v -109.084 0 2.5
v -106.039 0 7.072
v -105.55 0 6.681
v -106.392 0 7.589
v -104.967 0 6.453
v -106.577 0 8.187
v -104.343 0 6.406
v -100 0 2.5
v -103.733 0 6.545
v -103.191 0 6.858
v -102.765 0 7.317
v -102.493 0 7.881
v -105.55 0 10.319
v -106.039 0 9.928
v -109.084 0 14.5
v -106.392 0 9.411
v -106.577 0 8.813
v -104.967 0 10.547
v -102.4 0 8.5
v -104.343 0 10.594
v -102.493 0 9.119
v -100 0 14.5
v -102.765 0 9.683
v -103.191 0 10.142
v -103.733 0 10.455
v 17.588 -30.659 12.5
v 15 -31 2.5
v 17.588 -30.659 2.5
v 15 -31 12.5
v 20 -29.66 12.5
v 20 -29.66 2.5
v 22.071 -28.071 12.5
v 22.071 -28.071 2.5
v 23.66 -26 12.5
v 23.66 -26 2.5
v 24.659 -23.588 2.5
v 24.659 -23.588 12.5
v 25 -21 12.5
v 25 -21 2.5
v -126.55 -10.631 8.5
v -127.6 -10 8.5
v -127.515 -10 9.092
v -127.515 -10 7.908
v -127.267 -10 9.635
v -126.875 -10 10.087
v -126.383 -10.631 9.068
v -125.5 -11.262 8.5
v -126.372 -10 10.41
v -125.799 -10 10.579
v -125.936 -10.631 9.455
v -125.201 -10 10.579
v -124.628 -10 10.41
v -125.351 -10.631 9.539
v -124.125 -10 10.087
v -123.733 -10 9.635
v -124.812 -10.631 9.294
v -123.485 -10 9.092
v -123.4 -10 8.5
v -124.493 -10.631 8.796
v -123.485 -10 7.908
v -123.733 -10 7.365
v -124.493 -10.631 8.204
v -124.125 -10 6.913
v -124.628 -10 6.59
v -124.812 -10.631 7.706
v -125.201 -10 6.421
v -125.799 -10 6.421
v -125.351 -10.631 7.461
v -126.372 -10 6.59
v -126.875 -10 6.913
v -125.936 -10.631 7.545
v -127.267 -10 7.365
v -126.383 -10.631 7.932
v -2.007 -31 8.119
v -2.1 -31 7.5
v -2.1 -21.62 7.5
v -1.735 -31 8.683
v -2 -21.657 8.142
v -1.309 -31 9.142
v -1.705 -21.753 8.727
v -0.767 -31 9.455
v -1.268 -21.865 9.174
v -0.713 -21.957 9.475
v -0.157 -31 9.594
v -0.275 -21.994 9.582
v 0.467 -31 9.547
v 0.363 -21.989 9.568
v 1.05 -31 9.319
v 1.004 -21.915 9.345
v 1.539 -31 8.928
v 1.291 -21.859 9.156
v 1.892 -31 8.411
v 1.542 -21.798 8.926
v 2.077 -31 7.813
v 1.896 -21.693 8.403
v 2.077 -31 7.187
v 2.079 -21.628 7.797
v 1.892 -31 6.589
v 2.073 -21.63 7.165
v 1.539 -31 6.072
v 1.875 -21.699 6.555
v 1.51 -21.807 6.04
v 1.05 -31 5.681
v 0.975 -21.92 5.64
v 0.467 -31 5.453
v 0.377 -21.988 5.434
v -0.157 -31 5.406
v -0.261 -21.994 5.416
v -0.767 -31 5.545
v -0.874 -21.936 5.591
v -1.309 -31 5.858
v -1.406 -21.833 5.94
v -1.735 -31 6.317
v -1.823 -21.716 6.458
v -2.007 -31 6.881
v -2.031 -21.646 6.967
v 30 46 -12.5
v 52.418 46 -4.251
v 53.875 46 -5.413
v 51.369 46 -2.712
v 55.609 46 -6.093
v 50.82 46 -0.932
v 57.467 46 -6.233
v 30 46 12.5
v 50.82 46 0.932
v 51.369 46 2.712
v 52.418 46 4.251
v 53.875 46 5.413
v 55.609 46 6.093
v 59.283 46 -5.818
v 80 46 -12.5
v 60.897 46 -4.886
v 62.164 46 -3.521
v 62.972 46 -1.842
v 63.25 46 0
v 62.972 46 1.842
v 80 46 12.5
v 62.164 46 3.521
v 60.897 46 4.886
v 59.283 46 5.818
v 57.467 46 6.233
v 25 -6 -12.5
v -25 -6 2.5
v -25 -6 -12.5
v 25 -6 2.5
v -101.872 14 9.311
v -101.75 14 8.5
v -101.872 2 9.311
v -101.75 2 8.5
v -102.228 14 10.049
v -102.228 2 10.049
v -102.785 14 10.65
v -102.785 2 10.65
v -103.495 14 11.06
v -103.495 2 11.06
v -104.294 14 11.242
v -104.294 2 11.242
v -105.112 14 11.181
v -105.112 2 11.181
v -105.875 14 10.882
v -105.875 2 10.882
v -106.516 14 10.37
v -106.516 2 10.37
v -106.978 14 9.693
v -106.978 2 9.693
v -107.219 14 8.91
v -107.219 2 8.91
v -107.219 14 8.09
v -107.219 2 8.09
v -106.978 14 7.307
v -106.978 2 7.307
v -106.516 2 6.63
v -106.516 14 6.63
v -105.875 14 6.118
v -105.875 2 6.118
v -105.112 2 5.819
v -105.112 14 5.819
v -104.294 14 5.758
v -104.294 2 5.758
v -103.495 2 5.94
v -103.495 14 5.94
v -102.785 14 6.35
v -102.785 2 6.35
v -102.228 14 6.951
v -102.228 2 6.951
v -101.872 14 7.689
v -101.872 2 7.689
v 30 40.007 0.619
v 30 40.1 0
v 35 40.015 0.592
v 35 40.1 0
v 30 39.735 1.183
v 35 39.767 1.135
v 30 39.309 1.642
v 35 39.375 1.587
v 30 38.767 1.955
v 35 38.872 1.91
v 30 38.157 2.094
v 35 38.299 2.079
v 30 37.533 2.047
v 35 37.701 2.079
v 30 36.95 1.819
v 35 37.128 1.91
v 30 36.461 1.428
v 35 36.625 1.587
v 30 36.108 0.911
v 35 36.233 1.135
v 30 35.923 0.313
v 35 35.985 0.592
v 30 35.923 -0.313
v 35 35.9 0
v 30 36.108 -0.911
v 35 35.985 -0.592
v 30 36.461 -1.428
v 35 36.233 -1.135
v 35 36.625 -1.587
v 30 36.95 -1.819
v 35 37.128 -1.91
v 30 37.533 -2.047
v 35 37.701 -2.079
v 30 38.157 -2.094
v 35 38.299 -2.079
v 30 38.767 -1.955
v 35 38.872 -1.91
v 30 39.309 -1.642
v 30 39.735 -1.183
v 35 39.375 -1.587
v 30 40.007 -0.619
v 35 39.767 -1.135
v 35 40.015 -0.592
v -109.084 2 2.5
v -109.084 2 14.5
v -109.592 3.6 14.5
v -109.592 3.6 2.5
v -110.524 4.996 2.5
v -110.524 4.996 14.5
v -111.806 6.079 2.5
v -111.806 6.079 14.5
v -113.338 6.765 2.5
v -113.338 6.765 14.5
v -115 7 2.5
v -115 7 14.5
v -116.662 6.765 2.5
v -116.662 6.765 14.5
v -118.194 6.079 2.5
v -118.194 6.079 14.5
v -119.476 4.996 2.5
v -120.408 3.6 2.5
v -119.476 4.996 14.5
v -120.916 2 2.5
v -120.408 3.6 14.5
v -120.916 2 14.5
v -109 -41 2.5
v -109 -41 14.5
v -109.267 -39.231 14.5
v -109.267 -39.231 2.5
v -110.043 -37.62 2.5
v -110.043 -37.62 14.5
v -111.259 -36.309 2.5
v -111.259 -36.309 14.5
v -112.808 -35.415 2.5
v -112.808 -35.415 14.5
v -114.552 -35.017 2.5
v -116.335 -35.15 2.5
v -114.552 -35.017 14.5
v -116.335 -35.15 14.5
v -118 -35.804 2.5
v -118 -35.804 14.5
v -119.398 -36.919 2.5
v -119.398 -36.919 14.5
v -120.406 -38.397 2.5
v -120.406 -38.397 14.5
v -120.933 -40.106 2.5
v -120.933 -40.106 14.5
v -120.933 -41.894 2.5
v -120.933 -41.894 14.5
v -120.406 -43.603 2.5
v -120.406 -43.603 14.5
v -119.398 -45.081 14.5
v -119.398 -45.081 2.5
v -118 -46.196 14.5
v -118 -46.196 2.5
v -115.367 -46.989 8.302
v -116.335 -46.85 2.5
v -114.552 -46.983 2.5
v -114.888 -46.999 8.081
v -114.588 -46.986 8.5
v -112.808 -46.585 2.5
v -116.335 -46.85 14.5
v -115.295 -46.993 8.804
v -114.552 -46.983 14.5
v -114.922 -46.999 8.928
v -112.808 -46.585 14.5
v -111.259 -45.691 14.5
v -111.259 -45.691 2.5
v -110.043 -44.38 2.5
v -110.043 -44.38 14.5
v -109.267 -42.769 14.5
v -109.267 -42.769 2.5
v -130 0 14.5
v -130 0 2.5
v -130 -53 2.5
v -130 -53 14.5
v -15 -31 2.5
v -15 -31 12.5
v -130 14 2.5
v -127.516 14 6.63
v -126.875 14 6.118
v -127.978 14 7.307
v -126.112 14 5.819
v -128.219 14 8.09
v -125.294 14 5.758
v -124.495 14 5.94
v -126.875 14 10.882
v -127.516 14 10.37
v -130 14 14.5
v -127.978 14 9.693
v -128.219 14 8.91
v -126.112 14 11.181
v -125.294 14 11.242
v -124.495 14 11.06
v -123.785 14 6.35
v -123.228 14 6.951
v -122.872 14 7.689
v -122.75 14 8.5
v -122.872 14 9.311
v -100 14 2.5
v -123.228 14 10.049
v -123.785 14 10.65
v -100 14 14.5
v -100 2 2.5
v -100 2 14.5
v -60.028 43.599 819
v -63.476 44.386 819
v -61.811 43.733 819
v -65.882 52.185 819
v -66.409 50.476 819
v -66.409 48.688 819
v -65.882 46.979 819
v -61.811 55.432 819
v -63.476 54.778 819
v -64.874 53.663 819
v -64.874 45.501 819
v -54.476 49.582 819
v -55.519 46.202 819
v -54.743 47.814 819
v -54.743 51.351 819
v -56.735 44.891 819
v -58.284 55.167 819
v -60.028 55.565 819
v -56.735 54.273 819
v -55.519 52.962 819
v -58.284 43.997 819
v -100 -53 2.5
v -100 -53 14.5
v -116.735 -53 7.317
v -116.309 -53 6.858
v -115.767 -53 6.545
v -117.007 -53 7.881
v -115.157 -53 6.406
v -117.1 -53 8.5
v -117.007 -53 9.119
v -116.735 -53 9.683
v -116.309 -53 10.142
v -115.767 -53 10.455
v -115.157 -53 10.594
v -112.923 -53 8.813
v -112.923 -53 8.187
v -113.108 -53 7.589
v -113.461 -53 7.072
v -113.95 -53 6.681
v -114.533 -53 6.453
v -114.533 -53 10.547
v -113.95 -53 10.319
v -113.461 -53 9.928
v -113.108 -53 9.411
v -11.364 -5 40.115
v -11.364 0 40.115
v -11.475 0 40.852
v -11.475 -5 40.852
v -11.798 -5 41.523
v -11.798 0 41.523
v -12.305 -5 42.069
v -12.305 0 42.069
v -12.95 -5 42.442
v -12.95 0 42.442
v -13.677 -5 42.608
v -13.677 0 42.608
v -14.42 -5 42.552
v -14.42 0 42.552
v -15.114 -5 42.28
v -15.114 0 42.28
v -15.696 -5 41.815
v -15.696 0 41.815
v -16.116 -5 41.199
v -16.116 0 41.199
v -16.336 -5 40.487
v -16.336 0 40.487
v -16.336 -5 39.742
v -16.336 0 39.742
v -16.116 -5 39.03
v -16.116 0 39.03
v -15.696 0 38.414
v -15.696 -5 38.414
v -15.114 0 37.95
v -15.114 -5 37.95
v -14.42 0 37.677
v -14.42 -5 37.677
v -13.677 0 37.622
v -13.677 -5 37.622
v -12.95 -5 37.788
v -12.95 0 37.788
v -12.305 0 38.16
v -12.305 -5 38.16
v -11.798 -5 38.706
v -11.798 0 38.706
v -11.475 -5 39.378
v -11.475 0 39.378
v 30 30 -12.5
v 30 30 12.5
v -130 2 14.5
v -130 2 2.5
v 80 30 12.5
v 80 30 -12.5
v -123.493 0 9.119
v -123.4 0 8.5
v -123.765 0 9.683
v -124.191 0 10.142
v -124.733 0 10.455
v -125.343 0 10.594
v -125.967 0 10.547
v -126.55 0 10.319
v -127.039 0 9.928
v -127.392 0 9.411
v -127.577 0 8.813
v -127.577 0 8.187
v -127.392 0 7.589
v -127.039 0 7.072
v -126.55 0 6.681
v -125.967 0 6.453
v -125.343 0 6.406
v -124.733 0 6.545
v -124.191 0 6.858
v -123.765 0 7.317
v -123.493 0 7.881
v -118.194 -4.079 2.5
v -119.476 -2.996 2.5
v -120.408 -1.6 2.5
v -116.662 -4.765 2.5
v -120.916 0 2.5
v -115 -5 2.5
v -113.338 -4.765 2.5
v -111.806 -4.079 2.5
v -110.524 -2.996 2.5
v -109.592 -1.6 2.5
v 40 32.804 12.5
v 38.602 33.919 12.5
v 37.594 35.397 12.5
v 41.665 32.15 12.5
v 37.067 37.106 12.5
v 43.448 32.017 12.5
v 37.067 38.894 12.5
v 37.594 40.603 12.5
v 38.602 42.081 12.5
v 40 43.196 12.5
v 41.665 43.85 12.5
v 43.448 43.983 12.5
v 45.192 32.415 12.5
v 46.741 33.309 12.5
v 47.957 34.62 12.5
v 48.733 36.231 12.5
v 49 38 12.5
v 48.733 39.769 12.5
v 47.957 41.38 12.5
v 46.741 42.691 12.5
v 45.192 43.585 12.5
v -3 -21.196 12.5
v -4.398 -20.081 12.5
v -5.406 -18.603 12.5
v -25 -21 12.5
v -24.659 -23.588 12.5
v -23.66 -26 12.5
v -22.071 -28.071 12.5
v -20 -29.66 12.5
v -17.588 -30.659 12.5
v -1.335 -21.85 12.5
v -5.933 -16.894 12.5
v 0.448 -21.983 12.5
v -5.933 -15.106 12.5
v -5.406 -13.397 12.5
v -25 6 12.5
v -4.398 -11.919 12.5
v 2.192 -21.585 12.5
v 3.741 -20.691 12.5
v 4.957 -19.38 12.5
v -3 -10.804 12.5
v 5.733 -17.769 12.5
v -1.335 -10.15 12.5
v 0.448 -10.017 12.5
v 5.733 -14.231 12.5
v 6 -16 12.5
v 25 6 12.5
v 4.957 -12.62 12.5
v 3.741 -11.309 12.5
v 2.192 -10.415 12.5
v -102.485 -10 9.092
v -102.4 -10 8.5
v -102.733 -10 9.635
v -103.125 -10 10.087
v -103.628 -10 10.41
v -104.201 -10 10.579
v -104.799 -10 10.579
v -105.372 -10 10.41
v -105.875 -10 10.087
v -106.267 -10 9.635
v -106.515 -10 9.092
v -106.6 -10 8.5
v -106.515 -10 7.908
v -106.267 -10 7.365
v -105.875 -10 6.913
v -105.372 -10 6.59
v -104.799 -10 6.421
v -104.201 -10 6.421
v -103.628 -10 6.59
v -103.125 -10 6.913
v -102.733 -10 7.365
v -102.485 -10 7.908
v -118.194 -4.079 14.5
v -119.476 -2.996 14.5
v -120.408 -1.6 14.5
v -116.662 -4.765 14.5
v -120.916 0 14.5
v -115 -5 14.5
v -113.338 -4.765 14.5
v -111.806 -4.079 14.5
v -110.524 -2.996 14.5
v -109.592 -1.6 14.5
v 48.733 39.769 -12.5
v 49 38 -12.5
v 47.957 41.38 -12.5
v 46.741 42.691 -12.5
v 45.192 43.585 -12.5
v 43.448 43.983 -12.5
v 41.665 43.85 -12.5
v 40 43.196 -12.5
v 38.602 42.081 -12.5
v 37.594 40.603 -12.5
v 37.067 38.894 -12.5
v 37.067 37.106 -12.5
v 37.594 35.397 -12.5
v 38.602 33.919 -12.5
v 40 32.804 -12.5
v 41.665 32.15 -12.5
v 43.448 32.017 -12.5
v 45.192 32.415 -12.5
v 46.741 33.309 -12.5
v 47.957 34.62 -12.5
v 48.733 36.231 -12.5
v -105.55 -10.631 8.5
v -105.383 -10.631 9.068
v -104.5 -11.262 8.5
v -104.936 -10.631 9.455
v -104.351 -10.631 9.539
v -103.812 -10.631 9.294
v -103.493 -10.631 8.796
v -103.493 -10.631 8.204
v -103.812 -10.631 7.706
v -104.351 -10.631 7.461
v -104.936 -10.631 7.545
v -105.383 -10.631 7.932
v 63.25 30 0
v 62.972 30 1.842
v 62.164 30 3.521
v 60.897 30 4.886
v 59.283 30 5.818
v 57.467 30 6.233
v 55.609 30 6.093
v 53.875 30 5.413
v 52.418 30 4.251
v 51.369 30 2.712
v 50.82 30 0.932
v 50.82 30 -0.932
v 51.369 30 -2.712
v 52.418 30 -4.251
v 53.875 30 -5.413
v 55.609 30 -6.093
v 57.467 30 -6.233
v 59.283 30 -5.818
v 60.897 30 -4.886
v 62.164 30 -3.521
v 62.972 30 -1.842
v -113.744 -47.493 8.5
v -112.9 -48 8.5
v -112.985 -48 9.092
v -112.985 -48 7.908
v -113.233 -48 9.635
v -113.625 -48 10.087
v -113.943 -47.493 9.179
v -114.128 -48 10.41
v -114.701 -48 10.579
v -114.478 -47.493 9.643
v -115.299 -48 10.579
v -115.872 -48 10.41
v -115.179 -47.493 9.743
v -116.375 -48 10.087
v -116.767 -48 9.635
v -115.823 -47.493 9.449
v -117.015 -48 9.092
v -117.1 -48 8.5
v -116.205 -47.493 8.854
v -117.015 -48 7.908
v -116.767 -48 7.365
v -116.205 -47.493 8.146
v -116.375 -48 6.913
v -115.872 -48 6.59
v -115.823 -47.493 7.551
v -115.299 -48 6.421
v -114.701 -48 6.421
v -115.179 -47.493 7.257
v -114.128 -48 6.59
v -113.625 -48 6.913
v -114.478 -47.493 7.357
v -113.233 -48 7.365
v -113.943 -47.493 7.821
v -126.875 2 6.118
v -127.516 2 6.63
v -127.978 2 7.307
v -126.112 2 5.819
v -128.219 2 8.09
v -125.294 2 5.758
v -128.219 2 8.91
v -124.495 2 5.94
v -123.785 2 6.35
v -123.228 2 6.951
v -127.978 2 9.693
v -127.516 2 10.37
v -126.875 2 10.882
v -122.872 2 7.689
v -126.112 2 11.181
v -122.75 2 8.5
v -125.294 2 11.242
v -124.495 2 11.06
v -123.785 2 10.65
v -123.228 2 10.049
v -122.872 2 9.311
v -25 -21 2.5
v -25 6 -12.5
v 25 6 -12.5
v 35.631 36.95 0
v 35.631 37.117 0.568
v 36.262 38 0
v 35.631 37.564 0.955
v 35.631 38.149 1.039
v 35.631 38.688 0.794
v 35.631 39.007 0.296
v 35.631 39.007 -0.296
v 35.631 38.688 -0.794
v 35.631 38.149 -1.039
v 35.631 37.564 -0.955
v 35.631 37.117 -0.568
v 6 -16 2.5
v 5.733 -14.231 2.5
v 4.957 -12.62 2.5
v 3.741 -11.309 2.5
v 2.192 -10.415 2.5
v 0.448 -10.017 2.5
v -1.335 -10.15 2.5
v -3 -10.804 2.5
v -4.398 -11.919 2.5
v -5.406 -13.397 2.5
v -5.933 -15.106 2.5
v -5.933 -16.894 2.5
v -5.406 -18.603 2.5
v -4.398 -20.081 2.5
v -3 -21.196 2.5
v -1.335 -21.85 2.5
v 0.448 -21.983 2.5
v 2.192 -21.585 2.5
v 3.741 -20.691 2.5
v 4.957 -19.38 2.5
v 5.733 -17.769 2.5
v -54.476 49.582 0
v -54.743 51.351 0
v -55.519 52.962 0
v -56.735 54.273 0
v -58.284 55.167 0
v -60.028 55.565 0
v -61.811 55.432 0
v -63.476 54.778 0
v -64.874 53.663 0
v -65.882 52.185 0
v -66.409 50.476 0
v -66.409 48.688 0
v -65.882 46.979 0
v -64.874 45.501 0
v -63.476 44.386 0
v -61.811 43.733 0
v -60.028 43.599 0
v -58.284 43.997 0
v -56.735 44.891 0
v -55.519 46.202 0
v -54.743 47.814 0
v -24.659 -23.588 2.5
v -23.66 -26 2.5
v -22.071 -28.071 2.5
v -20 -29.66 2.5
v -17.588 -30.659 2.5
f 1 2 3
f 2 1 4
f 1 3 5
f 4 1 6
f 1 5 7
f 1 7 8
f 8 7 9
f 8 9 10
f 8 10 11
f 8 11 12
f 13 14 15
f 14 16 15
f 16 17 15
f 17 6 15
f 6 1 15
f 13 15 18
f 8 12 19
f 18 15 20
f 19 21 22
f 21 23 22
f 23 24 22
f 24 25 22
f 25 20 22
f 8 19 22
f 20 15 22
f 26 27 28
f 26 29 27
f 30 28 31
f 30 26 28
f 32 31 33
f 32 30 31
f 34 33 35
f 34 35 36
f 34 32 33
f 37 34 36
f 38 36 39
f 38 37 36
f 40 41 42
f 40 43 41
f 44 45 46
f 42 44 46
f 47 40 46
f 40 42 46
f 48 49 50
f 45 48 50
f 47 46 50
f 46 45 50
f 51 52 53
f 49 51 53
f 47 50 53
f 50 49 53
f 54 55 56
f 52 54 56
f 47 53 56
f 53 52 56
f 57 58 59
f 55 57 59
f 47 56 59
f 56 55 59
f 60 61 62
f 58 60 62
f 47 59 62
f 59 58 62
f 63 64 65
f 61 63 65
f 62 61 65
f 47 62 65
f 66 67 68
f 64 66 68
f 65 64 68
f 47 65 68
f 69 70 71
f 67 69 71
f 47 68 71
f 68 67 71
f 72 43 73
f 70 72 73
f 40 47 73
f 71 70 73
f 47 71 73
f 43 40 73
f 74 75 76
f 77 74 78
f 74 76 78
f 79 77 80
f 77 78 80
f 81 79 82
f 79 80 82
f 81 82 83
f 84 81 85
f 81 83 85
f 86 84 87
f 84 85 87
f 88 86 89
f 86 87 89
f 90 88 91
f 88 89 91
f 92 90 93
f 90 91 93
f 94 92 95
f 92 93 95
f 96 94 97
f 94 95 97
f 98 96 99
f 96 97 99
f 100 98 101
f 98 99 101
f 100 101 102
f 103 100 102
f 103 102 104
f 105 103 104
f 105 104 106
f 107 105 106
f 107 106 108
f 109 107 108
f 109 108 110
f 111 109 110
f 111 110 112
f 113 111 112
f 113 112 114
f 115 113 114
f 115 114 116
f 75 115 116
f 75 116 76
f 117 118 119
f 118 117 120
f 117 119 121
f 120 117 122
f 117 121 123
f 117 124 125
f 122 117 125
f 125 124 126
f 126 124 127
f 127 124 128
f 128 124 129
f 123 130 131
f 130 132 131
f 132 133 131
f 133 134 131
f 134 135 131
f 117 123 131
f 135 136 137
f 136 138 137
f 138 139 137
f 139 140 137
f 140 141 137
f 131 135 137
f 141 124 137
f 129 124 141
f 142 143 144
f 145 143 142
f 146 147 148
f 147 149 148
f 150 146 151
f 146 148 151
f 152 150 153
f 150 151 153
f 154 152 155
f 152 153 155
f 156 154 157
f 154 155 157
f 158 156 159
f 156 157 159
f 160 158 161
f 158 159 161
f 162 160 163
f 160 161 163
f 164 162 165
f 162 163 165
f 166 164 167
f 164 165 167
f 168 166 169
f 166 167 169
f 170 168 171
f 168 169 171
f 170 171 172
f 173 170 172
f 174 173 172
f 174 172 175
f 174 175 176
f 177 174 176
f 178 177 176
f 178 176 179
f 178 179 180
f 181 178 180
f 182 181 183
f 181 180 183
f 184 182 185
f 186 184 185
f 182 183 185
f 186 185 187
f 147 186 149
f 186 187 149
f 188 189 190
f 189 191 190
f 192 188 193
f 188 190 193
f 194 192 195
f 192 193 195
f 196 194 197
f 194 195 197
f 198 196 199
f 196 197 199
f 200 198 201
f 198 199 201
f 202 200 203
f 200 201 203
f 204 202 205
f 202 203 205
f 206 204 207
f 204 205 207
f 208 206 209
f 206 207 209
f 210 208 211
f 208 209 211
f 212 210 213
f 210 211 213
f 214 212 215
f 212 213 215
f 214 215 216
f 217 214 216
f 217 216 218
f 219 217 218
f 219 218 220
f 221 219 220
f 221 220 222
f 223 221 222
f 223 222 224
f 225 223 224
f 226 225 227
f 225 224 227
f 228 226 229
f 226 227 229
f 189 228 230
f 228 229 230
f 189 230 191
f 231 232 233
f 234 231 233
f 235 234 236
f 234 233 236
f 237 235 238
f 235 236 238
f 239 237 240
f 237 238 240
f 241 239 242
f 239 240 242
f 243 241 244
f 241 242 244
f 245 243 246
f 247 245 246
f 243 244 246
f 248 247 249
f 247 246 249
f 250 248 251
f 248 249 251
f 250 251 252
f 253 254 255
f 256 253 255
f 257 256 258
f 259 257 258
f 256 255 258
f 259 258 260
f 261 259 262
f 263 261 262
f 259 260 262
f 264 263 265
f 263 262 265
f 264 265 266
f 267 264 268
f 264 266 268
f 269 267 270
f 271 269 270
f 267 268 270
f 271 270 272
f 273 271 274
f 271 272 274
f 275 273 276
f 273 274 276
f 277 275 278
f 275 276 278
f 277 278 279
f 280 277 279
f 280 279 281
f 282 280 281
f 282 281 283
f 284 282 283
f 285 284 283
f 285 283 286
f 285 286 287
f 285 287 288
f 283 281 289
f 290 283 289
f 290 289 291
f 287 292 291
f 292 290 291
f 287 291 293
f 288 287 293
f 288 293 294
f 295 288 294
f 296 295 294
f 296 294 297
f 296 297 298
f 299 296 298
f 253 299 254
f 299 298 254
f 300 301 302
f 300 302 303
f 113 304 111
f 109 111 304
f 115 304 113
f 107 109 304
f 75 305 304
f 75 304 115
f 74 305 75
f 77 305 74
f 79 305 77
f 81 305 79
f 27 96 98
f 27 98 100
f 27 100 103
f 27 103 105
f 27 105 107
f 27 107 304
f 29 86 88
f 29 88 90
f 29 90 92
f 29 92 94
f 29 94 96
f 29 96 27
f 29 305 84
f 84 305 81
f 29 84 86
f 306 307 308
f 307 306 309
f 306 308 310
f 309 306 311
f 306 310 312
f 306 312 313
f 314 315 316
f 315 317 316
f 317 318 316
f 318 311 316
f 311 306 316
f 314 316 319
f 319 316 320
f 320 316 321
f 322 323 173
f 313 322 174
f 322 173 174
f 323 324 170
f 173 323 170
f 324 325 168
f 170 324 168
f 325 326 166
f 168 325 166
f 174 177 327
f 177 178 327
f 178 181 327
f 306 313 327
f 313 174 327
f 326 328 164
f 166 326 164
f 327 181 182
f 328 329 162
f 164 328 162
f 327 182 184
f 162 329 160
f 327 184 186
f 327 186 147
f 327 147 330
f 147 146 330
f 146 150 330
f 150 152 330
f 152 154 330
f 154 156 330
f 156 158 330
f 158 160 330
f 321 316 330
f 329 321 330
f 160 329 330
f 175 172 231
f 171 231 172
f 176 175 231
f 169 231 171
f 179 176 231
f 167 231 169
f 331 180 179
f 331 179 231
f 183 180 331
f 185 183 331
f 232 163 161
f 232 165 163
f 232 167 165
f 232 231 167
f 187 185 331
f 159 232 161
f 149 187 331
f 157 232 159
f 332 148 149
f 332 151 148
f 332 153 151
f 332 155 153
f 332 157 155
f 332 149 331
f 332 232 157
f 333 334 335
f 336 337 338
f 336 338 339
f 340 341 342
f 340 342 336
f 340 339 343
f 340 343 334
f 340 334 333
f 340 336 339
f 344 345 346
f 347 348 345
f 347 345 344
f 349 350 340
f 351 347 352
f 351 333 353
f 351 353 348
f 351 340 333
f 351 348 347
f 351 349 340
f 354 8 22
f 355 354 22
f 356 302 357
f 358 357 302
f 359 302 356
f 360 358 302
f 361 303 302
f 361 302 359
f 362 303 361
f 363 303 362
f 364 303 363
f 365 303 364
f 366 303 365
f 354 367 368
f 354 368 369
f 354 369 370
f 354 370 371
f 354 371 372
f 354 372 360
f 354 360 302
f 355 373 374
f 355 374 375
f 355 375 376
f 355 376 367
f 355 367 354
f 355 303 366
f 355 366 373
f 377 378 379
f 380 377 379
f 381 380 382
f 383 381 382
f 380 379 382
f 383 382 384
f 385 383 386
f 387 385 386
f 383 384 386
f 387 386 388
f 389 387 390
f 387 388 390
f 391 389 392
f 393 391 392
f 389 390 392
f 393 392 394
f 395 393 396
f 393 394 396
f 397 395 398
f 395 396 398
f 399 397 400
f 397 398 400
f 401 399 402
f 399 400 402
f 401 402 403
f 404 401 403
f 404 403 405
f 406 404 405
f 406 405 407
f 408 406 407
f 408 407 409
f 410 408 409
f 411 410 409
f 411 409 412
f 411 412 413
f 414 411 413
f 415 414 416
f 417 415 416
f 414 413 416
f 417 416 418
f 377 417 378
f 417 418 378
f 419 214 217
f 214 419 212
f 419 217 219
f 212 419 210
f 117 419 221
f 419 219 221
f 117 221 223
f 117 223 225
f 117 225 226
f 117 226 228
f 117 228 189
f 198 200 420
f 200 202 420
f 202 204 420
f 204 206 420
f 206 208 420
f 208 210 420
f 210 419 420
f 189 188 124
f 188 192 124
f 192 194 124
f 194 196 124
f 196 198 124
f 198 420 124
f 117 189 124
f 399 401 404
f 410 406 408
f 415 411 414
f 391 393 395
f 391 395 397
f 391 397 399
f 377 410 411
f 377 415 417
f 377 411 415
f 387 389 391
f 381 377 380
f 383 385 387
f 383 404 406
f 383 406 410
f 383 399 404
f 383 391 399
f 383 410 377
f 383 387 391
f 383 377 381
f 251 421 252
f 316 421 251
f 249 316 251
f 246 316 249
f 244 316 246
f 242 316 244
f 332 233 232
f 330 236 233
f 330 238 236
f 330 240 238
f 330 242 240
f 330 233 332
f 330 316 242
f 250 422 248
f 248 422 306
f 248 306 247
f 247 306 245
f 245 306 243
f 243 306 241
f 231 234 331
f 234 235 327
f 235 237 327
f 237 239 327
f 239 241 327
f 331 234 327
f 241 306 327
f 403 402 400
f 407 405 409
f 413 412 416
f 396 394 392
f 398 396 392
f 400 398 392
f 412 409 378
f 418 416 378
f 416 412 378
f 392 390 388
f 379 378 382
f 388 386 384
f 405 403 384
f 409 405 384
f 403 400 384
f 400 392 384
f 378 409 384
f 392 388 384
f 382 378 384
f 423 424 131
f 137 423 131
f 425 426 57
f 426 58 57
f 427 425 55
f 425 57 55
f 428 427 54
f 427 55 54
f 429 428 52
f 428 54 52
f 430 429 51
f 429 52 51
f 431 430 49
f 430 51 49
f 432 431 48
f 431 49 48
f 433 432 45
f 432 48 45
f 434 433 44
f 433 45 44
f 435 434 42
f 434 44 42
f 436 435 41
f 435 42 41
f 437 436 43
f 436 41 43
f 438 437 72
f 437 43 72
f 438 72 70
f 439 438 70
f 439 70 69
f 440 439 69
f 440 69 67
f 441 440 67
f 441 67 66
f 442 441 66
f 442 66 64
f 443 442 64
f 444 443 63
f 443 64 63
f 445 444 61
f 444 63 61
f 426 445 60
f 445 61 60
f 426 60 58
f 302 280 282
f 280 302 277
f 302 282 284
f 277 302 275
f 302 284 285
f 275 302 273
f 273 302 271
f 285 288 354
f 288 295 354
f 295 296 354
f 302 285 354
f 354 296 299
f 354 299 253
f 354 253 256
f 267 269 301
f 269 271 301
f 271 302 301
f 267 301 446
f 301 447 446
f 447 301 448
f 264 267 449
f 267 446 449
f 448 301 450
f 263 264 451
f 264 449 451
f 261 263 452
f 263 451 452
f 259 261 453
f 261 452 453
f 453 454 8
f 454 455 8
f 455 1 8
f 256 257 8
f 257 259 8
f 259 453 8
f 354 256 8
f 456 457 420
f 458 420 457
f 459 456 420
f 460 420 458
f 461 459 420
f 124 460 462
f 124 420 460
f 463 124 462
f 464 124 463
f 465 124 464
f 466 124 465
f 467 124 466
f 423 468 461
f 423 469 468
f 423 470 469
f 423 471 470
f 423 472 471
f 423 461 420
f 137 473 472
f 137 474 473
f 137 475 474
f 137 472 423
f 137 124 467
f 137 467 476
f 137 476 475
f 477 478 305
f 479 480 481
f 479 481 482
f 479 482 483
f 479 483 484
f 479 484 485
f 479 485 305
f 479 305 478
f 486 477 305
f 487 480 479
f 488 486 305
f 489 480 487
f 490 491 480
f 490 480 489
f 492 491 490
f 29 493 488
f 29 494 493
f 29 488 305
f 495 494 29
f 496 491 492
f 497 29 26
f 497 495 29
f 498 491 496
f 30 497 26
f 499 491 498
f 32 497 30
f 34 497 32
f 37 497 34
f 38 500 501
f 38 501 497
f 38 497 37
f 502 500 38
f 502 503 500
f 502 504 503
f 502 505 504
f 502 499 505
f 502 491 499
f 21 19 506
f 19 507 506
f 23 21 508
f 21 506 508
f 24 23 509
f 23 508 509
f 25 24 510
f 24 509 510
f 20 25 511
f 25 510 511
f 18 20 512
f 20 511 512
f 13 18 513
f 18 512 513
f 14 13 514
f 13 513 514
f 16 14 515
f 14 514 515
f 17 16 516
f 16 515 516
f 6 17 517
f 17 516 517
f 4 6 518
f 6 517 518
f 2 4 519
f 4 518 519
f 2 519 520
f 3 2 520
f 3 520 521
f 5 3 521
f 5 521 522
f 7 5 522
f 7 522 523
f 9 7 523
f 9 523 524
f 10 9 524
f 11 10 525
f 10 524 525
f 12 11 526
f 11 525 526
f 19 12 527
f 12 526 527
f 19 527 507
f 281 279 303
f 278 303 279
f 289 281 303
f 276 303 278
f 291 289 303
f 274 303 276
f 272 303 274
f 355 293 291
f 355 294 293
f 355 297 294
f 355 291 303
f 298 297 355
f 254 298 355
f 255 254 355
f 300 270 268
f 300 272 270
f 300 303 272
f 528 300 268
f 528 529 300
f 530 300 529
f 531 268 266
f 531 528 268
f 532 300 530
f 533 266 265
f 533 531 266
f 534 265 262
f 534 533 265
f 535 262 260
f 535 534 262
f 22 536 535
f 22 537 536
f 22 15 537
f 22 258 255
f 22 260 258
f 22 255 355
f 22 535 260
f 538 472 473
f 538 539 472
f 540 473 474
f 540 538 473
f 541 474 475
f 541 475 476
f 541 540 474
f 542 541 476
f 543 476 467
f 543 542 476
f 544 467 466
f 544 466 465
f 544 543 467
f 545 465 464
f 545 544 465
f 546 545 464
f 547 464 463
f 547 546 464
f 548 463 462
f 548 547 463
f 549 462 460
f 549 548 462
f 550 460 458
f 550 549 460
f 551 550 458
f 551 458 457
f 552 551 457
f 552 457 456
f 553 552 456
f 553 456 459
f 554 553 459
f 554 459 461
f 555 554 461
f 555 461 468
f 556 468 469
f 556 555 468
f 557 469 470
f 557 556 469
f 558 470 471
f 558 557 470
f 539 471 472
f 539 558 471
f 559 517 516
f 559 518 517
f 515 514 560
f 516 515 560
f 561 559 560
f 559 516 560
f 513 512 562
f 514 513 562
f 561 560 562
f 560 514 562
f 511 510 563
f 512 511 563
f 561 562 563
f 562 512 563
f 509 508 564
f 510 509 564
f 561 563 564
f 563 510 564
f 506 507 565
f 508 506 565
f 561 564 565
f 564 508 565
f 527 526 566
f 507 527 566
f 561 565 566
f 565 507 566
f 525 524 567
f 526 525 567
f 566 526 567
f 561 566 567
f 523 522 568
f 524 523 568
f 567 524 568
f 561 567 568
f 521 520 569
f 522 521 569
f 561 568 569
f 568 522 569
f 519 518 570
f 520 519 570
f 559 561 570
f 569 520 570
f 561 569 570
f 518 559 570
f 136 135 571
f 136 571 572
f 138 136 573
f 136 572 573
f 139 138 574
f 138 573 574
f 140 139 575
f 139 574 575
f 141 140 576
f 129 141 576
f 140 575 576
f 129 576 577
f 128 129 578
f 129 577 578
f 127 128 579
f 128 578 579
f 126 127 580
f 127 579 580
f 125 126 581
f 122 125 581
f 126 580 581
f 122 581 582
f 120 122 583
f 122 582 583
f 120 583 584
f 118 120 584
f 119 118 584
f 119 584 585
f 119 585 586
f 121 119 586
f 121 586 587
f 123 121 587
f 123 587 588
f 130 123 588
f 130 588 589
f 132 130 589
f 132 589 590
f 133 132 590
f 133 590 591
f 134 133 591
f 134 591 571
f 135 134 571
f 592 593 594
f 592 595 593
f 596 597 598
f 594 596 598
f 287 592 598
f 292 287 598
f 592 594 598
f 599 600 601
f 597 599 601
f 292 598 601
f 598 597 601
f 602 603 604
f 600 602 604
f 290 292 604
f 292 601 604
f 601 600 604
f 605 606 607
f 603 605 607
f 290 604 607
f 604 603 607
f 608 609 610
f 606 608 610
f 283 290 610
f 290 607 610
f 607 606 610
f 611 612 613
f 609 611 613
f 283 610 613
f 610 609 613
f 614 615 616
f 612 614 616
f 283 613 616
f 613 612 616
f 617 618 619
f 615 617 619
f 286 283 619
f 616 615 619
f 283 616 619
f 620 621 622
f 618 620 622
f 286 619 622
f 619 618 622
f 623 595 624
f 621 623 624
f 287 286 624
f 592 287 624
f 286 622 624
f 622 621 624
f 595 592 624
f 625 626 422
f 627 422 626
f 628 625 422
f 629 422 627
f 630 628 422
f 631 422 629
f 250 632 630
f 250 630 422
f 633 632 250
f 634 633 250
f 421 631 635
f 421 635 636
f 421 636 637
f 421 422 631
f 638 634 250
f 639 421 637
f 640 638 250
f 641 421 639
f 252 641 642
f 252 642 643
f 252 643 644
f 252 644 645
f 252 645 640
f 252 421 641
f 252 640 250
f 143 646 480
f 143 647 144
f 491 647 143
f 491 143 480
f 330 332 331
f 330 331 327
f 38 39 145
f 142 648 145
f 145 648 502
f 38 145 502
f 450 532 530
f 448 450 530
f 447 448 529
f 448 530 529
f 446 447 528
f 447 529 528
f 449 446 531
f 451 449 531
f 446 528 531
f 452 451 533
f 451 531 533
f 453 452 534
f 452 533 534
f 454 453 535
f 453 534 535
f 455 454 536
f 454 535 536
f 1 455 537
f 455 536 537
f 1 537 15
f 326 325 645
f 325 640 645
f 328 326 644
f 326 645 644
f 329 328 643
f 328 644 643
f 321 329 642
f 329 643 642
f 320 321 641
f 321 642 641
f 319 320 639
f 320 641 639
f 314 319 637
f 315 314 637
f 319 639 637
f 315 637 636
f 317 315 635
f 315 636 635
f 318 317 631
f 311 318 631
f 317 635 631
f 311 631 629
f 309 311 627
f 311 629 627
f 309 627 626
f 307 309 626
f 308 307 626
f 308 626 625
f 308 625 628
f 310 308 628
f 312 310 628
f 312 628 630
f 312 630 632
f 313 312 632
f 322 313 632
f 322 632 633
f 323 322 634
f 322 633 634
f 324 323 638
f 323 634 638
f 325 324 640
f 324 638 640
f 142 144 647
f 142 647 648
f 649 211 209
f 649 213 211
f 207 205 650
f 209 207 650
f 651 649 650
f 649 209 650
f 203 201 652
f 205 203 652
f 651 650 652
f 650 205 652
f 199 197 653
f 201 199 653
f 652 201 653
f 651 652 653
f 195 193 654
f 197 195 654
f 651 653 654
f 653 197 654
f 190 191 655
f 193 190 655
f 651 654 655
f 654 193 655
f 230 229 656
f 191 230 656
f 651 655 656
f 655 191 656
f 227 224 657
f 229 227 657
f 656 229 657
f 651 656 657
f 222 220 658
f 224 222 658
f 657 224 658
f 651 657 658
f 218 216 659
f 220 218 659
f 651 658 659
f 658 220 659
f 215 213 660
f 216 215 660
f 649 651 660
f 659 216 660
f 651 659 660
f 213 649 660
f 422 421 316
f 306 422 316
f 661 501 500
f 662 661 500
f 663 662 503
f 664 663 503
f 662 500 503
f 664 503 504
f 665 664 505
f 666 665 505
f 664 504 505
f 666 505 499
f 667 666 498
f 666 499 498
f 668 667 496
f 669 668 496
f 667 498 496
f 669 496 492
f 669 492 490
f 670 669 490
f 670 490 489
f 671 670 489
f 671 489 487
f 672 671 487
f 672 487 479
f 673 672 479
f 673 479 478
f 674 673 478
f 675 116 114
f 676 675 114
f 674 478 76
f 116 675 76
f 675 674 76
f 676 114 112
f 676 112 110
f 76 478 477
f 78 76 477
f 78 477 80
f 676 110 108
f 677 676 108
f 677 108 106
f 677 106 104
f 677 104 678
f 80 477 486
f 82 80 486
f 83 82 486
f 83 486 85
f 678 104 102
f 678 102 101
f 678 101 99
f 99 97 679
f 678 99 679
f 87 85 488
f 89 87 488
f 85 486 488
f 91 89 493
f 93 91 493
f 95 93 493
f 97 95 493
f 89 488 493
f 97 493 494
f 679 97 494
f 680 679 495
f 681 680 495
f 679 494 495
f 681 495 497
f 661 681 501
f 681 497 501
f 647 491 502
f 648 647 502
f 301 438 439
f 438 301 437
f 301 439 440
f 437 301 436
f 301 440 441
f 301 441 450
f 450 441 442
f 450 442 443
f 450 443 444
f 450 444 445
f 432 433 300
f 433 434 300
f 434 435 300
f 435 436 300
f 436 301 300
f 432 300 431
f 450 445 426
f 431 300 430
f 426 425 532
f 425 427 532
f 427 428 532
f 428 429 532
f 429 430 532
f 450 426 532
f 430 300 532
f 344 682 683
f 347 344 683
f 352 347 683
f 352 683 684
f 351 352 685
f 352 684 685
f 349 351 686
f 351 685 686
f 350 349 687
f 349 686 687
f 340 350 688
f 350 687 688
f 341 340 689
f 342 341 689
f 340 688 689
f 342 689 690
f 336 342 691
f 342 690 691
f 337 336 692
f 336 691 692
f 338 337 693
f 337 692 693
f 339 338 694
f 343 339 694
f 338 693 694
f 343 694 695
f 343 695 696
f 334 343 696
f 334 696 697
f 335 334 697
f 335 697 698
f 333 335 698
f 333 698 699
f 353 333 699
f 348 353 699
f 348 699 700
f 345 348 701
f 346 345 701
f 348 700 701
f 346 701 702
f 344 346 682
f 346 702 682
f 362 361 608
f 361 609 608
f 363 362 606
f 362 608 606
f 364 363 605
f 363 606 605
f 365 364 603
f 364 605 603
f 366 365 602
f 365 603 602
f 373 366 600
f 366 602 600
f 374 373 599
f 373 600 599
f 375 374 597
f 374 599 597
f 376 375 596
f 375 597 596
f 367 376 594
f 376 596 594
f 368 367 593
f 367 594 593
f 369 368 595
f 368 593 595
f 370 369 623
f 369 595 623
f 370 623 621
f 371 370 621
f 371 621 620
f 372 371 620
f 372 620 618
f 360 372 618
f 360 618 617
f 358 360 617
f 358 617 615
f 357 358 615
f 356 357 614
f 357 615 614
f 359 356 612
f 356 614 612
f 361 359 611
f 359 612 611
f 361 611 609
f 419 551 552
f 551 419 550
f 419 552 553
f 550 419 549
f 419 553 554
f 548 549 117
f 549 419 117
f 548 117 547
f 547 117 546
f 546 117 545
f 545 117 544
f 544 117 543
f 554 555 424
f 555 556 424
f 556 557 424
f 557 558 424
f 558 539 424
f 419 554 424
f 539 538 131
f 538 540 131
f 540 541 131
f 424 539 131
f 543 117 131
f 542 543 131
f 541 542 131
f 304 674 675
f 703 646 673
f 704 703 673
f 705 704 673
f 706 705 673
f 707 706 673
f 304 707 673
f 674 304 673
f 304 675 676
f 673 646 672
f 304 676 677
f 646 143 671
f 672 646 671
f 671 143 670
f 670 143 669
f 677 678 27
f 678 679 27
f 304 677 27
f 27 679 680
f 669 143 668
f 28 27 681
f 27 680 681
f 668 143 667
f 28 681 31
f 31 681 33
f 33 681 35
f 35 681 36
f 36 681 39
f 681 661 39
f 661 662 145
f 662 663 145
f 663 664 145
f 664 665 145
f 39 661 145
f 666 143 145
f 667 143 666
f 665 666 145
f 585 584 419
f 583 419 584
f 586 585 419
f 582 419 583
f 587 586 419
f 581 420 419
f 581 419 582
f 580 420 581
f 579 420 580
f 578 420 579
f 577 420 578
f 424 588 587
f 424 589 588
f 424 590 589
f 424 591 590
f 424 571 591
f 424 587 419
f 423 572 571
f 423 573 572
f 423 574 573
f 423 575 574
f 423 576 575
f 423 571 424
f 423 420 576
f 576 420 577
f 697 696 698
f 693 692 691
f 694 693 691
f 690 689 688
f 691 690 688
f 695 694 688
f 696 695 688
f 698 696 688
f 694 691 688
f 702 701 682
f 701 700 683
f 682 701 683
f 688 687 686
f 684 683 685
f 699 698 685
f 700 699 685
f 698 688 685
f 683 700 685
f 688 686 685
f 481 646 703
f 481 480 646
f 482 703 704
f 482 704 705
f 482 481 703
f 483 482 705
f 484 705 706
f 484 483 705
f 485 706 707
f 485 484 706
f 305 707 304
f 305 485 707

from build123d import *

# Parameters (mm, degrees)
F0_W      = 50
F0_H      = 25
F1_DEPTH  = 6
F2_W      = 50
F2_H      = 10
F3_DEPTH  = 25
F4_R      = 6
F5_DEPTH  = 25.001
F6_R      = 10
F7_W      = 30
F7_H      = 12
F8_DEPTH  = 53
F9_R      = 6
F10_DEPTH = 25
F11_W     = 30
F11_H     = 12
F12_DEPTH = 12
F13_R     = 6
F14_DEPTH = 27.001
F15_R     = 6
F16_DEPTH = 27.001
F17_R     = 6
F18_DEPTH = 819
F19_W     = 50
F19_H     = 16
F19_R     = 6
F20_DEPTH = 12.5
F21_R     = 6.25
F22_DEPTH = 25
F24_D     = 4.2
F24_DEPTH = 10
F24_TIP   = 1.2618073
F26_D     = 5.5
F26_DEPTH = 12
F26_TIP   = 1.6523667023
F28_D     = 4.2
F28_DEPTH = 10
F28_TIP   = 1.2618073
F30_D     = 4.2
F30_DEPTH = 5
F30_TIP   = 1.2618073
F32_D     = 4.2
F32_DEPTH = 5
F32_TIP   = 1.2618073
F33_R     = 2.5
F34_DEPTH = 5


with BuildPart() as f1:
    # F0 (on Front) → F1 (new body, symmetric)
    with BuildSketch(Plane.XZ):
        Rectangle(F0_W, F0_H)
    extrude(amount=F1_DEPTH, both=True)

    # F2 (on face) → F3 (join)
    with BuildSketch(Plane.XZ.offset(6)):
        with Locations((0, 7.5)):
            Rectangle(F2_W, F2_H)
    extrude(amount=F3_DEPTH)

    # F4 (on face) → F5 (cut, through all)
    with BuildSketch(Plane.XY.offset(12.5)):
        with Locations((0, -16)):
            Circle(F4_R)
    extrude(amount=-F5_DEPTH, mode=Mode.SUBTRACT)

    # F6
    f6_edges = [f1.edges().sort_by_distance(p)[0] for p in [
        (-25, -31, 7.5),
        (25, -31, 7.5),
    ]]
    fillet(f6_edges, radius=F6_R)

    # F24
    with Locations(Plane.XZ.offset(31)):
        with Locations((0, 7.5)):
            Hole(F24_D / 2, depth=F24_DEPTH)
            with Locations((0, 0, -(F24_DEPTH + F24_TIP / 2))):  # 118° drill point
                Cone(0, F24_D / 2, F24_TIP, mode=Mode.SUBTRACT)


with BuildPart() as f8:
    # F7 (on Front) → F8 (new body)
    with BuildSketch(Plane.XZ):
        with Locations((-115, 8.5)):
            Rectangle(F7_W, F7_H)
    extrude(amount=F8_DEPTH)

    # F9 (on face) → F10 (cut)
    with BuildSketch(Plane.XY.offset(14.5)):
        with Locations((-115, 1)):
            Circle(F9_R)
    extrude(amount=-F10_DEPTH, mode=Mode.SUBTRACT)

    # F15 (on face) → F16 (cut, through all)
    with BuildSketch(Plane.XY.offset(14.5)):
        with Locations((-115, -41)):
            Circle(F15_R)
    extrude(amount=-F16_DEPTH, mode=Mode.SUBTRACT)

    # F28
    with Locations(Plane(origin=(0, 0, 0), x_dir=(-1, 0, 0), z_dir=(0, 1, 0))):
        with Locations((104.5, 8.5), (125.5, 8.5)):
            Hole(F28_D / 2, depth=F28_DEPTH)
            with Locations((0, 0, -(F28_DEPTH + F28_TIP / 2))):  # 118° drill point
                Cone(0, F28_D / 2, F28_TIP, mode=Mode.SUBTRACT)

    # F30
    with Locations(Plane.XZ.offset(53)):
        with Locations((-115, 8.5)):
            Hole(F30_D / 2, depth=F30_DEPTH)
            with Locations((0, 0, -(F30_DEPTH + F30_TIP / 2))):  # 118° drill point
                Cone(0, F30_D / 2, F30_TIP, mode=Mode.SUBTRACT)


with BuildPart() as f12:
    # F11 (on face) → F12 (new body)
    with BuildSketch(Plane.XY.offset(14.5)):
        with Locations((-115, 8)):
            Rectangle(F11_W, F11_H)
    extrude(amount=-F12_DEPTH)

    # F13 (on face) → F14 (cut, through all)
    with BuildSketch(Plane.XY.offset(14.5)):
        with Locations((-115, 1)):
            Circle(F13_R)
    extrude(amount=-F14_DEPTH, mode=Mode.SUBTRACT)

    # F26
    with Locations(Plane(origin=(0, 14, 0), x_dir=(-1, 0, 0), z_dir=(0, 1, 0))):
        with Locations((104.5, 8.5), (125.5, 8.5)):
            Hole(F26_D / 2, depth=F26_DEPTH)
            with Locations((0, 0, -(F26_DEPTH + F26_TIP / 2))):  # 118° drill point
                Cone(0, F26_D / 2, F26_TIP, mode=Mode.SUBTRACT)


with BuildPart() as f18:
    # F17 (on Top) → F18 (new body)
    with BuildSketch(Plane.XY):
        with Locations((-60.4759976268, 49.5821088552)):
            Circle(F17_R)
    extrude(amount=F18_DEPTH)


with BuildPart() as f20:
    # F19 (on Top) → F20 (new body, symmetric)
    with BuildSketch(Plane.XY):
        with Locations((55, 38)):
            Rectangle(F19_W, F19_H)
        with Locations((43, 38)):
            Circle(F19_R, mode=Mode.SUBTRACT)
    extrude(amount=F20_DEPTH, both=True)

    # F21 (on face) → F22 (cut)
    with BuildSketch(Plane.XZ.offset(-30)):
        with Locations((57, 0)):
            Circle(F21_R)
    extrude(amount=-F22_DEPTH, mode=Mode.SUBTRACT)

    # F32
    with Locations(Plane(origin=(30, 0, 0), x_dir=(0, -1, 0), z_dir=(-1, 0, 0))):
        with Locations((-38, 0)):
            Hole(F32_D / 2, depth=F32_DEPTH)
            with Locations((0, 0, -(F32_DEPTH + F32_TIP / 2))):  # 118° drill point
                Cone(0, F32_D / 2, F32_TIP, mode=Mode.SUBTRACT)


with BuildPart() as f34:
    # F33 (on Front) → F34 (new body)
    with BuildSketch(Plane.XZ):
        with Locations((-13.8636240736, 40.1147268713)):
            Circle(F33_R)
    extrude(amount=F34_DEPTH)


solid = Compound([f1.part, f8.part, f12.part, f18.part, f20.part, f34.part])
